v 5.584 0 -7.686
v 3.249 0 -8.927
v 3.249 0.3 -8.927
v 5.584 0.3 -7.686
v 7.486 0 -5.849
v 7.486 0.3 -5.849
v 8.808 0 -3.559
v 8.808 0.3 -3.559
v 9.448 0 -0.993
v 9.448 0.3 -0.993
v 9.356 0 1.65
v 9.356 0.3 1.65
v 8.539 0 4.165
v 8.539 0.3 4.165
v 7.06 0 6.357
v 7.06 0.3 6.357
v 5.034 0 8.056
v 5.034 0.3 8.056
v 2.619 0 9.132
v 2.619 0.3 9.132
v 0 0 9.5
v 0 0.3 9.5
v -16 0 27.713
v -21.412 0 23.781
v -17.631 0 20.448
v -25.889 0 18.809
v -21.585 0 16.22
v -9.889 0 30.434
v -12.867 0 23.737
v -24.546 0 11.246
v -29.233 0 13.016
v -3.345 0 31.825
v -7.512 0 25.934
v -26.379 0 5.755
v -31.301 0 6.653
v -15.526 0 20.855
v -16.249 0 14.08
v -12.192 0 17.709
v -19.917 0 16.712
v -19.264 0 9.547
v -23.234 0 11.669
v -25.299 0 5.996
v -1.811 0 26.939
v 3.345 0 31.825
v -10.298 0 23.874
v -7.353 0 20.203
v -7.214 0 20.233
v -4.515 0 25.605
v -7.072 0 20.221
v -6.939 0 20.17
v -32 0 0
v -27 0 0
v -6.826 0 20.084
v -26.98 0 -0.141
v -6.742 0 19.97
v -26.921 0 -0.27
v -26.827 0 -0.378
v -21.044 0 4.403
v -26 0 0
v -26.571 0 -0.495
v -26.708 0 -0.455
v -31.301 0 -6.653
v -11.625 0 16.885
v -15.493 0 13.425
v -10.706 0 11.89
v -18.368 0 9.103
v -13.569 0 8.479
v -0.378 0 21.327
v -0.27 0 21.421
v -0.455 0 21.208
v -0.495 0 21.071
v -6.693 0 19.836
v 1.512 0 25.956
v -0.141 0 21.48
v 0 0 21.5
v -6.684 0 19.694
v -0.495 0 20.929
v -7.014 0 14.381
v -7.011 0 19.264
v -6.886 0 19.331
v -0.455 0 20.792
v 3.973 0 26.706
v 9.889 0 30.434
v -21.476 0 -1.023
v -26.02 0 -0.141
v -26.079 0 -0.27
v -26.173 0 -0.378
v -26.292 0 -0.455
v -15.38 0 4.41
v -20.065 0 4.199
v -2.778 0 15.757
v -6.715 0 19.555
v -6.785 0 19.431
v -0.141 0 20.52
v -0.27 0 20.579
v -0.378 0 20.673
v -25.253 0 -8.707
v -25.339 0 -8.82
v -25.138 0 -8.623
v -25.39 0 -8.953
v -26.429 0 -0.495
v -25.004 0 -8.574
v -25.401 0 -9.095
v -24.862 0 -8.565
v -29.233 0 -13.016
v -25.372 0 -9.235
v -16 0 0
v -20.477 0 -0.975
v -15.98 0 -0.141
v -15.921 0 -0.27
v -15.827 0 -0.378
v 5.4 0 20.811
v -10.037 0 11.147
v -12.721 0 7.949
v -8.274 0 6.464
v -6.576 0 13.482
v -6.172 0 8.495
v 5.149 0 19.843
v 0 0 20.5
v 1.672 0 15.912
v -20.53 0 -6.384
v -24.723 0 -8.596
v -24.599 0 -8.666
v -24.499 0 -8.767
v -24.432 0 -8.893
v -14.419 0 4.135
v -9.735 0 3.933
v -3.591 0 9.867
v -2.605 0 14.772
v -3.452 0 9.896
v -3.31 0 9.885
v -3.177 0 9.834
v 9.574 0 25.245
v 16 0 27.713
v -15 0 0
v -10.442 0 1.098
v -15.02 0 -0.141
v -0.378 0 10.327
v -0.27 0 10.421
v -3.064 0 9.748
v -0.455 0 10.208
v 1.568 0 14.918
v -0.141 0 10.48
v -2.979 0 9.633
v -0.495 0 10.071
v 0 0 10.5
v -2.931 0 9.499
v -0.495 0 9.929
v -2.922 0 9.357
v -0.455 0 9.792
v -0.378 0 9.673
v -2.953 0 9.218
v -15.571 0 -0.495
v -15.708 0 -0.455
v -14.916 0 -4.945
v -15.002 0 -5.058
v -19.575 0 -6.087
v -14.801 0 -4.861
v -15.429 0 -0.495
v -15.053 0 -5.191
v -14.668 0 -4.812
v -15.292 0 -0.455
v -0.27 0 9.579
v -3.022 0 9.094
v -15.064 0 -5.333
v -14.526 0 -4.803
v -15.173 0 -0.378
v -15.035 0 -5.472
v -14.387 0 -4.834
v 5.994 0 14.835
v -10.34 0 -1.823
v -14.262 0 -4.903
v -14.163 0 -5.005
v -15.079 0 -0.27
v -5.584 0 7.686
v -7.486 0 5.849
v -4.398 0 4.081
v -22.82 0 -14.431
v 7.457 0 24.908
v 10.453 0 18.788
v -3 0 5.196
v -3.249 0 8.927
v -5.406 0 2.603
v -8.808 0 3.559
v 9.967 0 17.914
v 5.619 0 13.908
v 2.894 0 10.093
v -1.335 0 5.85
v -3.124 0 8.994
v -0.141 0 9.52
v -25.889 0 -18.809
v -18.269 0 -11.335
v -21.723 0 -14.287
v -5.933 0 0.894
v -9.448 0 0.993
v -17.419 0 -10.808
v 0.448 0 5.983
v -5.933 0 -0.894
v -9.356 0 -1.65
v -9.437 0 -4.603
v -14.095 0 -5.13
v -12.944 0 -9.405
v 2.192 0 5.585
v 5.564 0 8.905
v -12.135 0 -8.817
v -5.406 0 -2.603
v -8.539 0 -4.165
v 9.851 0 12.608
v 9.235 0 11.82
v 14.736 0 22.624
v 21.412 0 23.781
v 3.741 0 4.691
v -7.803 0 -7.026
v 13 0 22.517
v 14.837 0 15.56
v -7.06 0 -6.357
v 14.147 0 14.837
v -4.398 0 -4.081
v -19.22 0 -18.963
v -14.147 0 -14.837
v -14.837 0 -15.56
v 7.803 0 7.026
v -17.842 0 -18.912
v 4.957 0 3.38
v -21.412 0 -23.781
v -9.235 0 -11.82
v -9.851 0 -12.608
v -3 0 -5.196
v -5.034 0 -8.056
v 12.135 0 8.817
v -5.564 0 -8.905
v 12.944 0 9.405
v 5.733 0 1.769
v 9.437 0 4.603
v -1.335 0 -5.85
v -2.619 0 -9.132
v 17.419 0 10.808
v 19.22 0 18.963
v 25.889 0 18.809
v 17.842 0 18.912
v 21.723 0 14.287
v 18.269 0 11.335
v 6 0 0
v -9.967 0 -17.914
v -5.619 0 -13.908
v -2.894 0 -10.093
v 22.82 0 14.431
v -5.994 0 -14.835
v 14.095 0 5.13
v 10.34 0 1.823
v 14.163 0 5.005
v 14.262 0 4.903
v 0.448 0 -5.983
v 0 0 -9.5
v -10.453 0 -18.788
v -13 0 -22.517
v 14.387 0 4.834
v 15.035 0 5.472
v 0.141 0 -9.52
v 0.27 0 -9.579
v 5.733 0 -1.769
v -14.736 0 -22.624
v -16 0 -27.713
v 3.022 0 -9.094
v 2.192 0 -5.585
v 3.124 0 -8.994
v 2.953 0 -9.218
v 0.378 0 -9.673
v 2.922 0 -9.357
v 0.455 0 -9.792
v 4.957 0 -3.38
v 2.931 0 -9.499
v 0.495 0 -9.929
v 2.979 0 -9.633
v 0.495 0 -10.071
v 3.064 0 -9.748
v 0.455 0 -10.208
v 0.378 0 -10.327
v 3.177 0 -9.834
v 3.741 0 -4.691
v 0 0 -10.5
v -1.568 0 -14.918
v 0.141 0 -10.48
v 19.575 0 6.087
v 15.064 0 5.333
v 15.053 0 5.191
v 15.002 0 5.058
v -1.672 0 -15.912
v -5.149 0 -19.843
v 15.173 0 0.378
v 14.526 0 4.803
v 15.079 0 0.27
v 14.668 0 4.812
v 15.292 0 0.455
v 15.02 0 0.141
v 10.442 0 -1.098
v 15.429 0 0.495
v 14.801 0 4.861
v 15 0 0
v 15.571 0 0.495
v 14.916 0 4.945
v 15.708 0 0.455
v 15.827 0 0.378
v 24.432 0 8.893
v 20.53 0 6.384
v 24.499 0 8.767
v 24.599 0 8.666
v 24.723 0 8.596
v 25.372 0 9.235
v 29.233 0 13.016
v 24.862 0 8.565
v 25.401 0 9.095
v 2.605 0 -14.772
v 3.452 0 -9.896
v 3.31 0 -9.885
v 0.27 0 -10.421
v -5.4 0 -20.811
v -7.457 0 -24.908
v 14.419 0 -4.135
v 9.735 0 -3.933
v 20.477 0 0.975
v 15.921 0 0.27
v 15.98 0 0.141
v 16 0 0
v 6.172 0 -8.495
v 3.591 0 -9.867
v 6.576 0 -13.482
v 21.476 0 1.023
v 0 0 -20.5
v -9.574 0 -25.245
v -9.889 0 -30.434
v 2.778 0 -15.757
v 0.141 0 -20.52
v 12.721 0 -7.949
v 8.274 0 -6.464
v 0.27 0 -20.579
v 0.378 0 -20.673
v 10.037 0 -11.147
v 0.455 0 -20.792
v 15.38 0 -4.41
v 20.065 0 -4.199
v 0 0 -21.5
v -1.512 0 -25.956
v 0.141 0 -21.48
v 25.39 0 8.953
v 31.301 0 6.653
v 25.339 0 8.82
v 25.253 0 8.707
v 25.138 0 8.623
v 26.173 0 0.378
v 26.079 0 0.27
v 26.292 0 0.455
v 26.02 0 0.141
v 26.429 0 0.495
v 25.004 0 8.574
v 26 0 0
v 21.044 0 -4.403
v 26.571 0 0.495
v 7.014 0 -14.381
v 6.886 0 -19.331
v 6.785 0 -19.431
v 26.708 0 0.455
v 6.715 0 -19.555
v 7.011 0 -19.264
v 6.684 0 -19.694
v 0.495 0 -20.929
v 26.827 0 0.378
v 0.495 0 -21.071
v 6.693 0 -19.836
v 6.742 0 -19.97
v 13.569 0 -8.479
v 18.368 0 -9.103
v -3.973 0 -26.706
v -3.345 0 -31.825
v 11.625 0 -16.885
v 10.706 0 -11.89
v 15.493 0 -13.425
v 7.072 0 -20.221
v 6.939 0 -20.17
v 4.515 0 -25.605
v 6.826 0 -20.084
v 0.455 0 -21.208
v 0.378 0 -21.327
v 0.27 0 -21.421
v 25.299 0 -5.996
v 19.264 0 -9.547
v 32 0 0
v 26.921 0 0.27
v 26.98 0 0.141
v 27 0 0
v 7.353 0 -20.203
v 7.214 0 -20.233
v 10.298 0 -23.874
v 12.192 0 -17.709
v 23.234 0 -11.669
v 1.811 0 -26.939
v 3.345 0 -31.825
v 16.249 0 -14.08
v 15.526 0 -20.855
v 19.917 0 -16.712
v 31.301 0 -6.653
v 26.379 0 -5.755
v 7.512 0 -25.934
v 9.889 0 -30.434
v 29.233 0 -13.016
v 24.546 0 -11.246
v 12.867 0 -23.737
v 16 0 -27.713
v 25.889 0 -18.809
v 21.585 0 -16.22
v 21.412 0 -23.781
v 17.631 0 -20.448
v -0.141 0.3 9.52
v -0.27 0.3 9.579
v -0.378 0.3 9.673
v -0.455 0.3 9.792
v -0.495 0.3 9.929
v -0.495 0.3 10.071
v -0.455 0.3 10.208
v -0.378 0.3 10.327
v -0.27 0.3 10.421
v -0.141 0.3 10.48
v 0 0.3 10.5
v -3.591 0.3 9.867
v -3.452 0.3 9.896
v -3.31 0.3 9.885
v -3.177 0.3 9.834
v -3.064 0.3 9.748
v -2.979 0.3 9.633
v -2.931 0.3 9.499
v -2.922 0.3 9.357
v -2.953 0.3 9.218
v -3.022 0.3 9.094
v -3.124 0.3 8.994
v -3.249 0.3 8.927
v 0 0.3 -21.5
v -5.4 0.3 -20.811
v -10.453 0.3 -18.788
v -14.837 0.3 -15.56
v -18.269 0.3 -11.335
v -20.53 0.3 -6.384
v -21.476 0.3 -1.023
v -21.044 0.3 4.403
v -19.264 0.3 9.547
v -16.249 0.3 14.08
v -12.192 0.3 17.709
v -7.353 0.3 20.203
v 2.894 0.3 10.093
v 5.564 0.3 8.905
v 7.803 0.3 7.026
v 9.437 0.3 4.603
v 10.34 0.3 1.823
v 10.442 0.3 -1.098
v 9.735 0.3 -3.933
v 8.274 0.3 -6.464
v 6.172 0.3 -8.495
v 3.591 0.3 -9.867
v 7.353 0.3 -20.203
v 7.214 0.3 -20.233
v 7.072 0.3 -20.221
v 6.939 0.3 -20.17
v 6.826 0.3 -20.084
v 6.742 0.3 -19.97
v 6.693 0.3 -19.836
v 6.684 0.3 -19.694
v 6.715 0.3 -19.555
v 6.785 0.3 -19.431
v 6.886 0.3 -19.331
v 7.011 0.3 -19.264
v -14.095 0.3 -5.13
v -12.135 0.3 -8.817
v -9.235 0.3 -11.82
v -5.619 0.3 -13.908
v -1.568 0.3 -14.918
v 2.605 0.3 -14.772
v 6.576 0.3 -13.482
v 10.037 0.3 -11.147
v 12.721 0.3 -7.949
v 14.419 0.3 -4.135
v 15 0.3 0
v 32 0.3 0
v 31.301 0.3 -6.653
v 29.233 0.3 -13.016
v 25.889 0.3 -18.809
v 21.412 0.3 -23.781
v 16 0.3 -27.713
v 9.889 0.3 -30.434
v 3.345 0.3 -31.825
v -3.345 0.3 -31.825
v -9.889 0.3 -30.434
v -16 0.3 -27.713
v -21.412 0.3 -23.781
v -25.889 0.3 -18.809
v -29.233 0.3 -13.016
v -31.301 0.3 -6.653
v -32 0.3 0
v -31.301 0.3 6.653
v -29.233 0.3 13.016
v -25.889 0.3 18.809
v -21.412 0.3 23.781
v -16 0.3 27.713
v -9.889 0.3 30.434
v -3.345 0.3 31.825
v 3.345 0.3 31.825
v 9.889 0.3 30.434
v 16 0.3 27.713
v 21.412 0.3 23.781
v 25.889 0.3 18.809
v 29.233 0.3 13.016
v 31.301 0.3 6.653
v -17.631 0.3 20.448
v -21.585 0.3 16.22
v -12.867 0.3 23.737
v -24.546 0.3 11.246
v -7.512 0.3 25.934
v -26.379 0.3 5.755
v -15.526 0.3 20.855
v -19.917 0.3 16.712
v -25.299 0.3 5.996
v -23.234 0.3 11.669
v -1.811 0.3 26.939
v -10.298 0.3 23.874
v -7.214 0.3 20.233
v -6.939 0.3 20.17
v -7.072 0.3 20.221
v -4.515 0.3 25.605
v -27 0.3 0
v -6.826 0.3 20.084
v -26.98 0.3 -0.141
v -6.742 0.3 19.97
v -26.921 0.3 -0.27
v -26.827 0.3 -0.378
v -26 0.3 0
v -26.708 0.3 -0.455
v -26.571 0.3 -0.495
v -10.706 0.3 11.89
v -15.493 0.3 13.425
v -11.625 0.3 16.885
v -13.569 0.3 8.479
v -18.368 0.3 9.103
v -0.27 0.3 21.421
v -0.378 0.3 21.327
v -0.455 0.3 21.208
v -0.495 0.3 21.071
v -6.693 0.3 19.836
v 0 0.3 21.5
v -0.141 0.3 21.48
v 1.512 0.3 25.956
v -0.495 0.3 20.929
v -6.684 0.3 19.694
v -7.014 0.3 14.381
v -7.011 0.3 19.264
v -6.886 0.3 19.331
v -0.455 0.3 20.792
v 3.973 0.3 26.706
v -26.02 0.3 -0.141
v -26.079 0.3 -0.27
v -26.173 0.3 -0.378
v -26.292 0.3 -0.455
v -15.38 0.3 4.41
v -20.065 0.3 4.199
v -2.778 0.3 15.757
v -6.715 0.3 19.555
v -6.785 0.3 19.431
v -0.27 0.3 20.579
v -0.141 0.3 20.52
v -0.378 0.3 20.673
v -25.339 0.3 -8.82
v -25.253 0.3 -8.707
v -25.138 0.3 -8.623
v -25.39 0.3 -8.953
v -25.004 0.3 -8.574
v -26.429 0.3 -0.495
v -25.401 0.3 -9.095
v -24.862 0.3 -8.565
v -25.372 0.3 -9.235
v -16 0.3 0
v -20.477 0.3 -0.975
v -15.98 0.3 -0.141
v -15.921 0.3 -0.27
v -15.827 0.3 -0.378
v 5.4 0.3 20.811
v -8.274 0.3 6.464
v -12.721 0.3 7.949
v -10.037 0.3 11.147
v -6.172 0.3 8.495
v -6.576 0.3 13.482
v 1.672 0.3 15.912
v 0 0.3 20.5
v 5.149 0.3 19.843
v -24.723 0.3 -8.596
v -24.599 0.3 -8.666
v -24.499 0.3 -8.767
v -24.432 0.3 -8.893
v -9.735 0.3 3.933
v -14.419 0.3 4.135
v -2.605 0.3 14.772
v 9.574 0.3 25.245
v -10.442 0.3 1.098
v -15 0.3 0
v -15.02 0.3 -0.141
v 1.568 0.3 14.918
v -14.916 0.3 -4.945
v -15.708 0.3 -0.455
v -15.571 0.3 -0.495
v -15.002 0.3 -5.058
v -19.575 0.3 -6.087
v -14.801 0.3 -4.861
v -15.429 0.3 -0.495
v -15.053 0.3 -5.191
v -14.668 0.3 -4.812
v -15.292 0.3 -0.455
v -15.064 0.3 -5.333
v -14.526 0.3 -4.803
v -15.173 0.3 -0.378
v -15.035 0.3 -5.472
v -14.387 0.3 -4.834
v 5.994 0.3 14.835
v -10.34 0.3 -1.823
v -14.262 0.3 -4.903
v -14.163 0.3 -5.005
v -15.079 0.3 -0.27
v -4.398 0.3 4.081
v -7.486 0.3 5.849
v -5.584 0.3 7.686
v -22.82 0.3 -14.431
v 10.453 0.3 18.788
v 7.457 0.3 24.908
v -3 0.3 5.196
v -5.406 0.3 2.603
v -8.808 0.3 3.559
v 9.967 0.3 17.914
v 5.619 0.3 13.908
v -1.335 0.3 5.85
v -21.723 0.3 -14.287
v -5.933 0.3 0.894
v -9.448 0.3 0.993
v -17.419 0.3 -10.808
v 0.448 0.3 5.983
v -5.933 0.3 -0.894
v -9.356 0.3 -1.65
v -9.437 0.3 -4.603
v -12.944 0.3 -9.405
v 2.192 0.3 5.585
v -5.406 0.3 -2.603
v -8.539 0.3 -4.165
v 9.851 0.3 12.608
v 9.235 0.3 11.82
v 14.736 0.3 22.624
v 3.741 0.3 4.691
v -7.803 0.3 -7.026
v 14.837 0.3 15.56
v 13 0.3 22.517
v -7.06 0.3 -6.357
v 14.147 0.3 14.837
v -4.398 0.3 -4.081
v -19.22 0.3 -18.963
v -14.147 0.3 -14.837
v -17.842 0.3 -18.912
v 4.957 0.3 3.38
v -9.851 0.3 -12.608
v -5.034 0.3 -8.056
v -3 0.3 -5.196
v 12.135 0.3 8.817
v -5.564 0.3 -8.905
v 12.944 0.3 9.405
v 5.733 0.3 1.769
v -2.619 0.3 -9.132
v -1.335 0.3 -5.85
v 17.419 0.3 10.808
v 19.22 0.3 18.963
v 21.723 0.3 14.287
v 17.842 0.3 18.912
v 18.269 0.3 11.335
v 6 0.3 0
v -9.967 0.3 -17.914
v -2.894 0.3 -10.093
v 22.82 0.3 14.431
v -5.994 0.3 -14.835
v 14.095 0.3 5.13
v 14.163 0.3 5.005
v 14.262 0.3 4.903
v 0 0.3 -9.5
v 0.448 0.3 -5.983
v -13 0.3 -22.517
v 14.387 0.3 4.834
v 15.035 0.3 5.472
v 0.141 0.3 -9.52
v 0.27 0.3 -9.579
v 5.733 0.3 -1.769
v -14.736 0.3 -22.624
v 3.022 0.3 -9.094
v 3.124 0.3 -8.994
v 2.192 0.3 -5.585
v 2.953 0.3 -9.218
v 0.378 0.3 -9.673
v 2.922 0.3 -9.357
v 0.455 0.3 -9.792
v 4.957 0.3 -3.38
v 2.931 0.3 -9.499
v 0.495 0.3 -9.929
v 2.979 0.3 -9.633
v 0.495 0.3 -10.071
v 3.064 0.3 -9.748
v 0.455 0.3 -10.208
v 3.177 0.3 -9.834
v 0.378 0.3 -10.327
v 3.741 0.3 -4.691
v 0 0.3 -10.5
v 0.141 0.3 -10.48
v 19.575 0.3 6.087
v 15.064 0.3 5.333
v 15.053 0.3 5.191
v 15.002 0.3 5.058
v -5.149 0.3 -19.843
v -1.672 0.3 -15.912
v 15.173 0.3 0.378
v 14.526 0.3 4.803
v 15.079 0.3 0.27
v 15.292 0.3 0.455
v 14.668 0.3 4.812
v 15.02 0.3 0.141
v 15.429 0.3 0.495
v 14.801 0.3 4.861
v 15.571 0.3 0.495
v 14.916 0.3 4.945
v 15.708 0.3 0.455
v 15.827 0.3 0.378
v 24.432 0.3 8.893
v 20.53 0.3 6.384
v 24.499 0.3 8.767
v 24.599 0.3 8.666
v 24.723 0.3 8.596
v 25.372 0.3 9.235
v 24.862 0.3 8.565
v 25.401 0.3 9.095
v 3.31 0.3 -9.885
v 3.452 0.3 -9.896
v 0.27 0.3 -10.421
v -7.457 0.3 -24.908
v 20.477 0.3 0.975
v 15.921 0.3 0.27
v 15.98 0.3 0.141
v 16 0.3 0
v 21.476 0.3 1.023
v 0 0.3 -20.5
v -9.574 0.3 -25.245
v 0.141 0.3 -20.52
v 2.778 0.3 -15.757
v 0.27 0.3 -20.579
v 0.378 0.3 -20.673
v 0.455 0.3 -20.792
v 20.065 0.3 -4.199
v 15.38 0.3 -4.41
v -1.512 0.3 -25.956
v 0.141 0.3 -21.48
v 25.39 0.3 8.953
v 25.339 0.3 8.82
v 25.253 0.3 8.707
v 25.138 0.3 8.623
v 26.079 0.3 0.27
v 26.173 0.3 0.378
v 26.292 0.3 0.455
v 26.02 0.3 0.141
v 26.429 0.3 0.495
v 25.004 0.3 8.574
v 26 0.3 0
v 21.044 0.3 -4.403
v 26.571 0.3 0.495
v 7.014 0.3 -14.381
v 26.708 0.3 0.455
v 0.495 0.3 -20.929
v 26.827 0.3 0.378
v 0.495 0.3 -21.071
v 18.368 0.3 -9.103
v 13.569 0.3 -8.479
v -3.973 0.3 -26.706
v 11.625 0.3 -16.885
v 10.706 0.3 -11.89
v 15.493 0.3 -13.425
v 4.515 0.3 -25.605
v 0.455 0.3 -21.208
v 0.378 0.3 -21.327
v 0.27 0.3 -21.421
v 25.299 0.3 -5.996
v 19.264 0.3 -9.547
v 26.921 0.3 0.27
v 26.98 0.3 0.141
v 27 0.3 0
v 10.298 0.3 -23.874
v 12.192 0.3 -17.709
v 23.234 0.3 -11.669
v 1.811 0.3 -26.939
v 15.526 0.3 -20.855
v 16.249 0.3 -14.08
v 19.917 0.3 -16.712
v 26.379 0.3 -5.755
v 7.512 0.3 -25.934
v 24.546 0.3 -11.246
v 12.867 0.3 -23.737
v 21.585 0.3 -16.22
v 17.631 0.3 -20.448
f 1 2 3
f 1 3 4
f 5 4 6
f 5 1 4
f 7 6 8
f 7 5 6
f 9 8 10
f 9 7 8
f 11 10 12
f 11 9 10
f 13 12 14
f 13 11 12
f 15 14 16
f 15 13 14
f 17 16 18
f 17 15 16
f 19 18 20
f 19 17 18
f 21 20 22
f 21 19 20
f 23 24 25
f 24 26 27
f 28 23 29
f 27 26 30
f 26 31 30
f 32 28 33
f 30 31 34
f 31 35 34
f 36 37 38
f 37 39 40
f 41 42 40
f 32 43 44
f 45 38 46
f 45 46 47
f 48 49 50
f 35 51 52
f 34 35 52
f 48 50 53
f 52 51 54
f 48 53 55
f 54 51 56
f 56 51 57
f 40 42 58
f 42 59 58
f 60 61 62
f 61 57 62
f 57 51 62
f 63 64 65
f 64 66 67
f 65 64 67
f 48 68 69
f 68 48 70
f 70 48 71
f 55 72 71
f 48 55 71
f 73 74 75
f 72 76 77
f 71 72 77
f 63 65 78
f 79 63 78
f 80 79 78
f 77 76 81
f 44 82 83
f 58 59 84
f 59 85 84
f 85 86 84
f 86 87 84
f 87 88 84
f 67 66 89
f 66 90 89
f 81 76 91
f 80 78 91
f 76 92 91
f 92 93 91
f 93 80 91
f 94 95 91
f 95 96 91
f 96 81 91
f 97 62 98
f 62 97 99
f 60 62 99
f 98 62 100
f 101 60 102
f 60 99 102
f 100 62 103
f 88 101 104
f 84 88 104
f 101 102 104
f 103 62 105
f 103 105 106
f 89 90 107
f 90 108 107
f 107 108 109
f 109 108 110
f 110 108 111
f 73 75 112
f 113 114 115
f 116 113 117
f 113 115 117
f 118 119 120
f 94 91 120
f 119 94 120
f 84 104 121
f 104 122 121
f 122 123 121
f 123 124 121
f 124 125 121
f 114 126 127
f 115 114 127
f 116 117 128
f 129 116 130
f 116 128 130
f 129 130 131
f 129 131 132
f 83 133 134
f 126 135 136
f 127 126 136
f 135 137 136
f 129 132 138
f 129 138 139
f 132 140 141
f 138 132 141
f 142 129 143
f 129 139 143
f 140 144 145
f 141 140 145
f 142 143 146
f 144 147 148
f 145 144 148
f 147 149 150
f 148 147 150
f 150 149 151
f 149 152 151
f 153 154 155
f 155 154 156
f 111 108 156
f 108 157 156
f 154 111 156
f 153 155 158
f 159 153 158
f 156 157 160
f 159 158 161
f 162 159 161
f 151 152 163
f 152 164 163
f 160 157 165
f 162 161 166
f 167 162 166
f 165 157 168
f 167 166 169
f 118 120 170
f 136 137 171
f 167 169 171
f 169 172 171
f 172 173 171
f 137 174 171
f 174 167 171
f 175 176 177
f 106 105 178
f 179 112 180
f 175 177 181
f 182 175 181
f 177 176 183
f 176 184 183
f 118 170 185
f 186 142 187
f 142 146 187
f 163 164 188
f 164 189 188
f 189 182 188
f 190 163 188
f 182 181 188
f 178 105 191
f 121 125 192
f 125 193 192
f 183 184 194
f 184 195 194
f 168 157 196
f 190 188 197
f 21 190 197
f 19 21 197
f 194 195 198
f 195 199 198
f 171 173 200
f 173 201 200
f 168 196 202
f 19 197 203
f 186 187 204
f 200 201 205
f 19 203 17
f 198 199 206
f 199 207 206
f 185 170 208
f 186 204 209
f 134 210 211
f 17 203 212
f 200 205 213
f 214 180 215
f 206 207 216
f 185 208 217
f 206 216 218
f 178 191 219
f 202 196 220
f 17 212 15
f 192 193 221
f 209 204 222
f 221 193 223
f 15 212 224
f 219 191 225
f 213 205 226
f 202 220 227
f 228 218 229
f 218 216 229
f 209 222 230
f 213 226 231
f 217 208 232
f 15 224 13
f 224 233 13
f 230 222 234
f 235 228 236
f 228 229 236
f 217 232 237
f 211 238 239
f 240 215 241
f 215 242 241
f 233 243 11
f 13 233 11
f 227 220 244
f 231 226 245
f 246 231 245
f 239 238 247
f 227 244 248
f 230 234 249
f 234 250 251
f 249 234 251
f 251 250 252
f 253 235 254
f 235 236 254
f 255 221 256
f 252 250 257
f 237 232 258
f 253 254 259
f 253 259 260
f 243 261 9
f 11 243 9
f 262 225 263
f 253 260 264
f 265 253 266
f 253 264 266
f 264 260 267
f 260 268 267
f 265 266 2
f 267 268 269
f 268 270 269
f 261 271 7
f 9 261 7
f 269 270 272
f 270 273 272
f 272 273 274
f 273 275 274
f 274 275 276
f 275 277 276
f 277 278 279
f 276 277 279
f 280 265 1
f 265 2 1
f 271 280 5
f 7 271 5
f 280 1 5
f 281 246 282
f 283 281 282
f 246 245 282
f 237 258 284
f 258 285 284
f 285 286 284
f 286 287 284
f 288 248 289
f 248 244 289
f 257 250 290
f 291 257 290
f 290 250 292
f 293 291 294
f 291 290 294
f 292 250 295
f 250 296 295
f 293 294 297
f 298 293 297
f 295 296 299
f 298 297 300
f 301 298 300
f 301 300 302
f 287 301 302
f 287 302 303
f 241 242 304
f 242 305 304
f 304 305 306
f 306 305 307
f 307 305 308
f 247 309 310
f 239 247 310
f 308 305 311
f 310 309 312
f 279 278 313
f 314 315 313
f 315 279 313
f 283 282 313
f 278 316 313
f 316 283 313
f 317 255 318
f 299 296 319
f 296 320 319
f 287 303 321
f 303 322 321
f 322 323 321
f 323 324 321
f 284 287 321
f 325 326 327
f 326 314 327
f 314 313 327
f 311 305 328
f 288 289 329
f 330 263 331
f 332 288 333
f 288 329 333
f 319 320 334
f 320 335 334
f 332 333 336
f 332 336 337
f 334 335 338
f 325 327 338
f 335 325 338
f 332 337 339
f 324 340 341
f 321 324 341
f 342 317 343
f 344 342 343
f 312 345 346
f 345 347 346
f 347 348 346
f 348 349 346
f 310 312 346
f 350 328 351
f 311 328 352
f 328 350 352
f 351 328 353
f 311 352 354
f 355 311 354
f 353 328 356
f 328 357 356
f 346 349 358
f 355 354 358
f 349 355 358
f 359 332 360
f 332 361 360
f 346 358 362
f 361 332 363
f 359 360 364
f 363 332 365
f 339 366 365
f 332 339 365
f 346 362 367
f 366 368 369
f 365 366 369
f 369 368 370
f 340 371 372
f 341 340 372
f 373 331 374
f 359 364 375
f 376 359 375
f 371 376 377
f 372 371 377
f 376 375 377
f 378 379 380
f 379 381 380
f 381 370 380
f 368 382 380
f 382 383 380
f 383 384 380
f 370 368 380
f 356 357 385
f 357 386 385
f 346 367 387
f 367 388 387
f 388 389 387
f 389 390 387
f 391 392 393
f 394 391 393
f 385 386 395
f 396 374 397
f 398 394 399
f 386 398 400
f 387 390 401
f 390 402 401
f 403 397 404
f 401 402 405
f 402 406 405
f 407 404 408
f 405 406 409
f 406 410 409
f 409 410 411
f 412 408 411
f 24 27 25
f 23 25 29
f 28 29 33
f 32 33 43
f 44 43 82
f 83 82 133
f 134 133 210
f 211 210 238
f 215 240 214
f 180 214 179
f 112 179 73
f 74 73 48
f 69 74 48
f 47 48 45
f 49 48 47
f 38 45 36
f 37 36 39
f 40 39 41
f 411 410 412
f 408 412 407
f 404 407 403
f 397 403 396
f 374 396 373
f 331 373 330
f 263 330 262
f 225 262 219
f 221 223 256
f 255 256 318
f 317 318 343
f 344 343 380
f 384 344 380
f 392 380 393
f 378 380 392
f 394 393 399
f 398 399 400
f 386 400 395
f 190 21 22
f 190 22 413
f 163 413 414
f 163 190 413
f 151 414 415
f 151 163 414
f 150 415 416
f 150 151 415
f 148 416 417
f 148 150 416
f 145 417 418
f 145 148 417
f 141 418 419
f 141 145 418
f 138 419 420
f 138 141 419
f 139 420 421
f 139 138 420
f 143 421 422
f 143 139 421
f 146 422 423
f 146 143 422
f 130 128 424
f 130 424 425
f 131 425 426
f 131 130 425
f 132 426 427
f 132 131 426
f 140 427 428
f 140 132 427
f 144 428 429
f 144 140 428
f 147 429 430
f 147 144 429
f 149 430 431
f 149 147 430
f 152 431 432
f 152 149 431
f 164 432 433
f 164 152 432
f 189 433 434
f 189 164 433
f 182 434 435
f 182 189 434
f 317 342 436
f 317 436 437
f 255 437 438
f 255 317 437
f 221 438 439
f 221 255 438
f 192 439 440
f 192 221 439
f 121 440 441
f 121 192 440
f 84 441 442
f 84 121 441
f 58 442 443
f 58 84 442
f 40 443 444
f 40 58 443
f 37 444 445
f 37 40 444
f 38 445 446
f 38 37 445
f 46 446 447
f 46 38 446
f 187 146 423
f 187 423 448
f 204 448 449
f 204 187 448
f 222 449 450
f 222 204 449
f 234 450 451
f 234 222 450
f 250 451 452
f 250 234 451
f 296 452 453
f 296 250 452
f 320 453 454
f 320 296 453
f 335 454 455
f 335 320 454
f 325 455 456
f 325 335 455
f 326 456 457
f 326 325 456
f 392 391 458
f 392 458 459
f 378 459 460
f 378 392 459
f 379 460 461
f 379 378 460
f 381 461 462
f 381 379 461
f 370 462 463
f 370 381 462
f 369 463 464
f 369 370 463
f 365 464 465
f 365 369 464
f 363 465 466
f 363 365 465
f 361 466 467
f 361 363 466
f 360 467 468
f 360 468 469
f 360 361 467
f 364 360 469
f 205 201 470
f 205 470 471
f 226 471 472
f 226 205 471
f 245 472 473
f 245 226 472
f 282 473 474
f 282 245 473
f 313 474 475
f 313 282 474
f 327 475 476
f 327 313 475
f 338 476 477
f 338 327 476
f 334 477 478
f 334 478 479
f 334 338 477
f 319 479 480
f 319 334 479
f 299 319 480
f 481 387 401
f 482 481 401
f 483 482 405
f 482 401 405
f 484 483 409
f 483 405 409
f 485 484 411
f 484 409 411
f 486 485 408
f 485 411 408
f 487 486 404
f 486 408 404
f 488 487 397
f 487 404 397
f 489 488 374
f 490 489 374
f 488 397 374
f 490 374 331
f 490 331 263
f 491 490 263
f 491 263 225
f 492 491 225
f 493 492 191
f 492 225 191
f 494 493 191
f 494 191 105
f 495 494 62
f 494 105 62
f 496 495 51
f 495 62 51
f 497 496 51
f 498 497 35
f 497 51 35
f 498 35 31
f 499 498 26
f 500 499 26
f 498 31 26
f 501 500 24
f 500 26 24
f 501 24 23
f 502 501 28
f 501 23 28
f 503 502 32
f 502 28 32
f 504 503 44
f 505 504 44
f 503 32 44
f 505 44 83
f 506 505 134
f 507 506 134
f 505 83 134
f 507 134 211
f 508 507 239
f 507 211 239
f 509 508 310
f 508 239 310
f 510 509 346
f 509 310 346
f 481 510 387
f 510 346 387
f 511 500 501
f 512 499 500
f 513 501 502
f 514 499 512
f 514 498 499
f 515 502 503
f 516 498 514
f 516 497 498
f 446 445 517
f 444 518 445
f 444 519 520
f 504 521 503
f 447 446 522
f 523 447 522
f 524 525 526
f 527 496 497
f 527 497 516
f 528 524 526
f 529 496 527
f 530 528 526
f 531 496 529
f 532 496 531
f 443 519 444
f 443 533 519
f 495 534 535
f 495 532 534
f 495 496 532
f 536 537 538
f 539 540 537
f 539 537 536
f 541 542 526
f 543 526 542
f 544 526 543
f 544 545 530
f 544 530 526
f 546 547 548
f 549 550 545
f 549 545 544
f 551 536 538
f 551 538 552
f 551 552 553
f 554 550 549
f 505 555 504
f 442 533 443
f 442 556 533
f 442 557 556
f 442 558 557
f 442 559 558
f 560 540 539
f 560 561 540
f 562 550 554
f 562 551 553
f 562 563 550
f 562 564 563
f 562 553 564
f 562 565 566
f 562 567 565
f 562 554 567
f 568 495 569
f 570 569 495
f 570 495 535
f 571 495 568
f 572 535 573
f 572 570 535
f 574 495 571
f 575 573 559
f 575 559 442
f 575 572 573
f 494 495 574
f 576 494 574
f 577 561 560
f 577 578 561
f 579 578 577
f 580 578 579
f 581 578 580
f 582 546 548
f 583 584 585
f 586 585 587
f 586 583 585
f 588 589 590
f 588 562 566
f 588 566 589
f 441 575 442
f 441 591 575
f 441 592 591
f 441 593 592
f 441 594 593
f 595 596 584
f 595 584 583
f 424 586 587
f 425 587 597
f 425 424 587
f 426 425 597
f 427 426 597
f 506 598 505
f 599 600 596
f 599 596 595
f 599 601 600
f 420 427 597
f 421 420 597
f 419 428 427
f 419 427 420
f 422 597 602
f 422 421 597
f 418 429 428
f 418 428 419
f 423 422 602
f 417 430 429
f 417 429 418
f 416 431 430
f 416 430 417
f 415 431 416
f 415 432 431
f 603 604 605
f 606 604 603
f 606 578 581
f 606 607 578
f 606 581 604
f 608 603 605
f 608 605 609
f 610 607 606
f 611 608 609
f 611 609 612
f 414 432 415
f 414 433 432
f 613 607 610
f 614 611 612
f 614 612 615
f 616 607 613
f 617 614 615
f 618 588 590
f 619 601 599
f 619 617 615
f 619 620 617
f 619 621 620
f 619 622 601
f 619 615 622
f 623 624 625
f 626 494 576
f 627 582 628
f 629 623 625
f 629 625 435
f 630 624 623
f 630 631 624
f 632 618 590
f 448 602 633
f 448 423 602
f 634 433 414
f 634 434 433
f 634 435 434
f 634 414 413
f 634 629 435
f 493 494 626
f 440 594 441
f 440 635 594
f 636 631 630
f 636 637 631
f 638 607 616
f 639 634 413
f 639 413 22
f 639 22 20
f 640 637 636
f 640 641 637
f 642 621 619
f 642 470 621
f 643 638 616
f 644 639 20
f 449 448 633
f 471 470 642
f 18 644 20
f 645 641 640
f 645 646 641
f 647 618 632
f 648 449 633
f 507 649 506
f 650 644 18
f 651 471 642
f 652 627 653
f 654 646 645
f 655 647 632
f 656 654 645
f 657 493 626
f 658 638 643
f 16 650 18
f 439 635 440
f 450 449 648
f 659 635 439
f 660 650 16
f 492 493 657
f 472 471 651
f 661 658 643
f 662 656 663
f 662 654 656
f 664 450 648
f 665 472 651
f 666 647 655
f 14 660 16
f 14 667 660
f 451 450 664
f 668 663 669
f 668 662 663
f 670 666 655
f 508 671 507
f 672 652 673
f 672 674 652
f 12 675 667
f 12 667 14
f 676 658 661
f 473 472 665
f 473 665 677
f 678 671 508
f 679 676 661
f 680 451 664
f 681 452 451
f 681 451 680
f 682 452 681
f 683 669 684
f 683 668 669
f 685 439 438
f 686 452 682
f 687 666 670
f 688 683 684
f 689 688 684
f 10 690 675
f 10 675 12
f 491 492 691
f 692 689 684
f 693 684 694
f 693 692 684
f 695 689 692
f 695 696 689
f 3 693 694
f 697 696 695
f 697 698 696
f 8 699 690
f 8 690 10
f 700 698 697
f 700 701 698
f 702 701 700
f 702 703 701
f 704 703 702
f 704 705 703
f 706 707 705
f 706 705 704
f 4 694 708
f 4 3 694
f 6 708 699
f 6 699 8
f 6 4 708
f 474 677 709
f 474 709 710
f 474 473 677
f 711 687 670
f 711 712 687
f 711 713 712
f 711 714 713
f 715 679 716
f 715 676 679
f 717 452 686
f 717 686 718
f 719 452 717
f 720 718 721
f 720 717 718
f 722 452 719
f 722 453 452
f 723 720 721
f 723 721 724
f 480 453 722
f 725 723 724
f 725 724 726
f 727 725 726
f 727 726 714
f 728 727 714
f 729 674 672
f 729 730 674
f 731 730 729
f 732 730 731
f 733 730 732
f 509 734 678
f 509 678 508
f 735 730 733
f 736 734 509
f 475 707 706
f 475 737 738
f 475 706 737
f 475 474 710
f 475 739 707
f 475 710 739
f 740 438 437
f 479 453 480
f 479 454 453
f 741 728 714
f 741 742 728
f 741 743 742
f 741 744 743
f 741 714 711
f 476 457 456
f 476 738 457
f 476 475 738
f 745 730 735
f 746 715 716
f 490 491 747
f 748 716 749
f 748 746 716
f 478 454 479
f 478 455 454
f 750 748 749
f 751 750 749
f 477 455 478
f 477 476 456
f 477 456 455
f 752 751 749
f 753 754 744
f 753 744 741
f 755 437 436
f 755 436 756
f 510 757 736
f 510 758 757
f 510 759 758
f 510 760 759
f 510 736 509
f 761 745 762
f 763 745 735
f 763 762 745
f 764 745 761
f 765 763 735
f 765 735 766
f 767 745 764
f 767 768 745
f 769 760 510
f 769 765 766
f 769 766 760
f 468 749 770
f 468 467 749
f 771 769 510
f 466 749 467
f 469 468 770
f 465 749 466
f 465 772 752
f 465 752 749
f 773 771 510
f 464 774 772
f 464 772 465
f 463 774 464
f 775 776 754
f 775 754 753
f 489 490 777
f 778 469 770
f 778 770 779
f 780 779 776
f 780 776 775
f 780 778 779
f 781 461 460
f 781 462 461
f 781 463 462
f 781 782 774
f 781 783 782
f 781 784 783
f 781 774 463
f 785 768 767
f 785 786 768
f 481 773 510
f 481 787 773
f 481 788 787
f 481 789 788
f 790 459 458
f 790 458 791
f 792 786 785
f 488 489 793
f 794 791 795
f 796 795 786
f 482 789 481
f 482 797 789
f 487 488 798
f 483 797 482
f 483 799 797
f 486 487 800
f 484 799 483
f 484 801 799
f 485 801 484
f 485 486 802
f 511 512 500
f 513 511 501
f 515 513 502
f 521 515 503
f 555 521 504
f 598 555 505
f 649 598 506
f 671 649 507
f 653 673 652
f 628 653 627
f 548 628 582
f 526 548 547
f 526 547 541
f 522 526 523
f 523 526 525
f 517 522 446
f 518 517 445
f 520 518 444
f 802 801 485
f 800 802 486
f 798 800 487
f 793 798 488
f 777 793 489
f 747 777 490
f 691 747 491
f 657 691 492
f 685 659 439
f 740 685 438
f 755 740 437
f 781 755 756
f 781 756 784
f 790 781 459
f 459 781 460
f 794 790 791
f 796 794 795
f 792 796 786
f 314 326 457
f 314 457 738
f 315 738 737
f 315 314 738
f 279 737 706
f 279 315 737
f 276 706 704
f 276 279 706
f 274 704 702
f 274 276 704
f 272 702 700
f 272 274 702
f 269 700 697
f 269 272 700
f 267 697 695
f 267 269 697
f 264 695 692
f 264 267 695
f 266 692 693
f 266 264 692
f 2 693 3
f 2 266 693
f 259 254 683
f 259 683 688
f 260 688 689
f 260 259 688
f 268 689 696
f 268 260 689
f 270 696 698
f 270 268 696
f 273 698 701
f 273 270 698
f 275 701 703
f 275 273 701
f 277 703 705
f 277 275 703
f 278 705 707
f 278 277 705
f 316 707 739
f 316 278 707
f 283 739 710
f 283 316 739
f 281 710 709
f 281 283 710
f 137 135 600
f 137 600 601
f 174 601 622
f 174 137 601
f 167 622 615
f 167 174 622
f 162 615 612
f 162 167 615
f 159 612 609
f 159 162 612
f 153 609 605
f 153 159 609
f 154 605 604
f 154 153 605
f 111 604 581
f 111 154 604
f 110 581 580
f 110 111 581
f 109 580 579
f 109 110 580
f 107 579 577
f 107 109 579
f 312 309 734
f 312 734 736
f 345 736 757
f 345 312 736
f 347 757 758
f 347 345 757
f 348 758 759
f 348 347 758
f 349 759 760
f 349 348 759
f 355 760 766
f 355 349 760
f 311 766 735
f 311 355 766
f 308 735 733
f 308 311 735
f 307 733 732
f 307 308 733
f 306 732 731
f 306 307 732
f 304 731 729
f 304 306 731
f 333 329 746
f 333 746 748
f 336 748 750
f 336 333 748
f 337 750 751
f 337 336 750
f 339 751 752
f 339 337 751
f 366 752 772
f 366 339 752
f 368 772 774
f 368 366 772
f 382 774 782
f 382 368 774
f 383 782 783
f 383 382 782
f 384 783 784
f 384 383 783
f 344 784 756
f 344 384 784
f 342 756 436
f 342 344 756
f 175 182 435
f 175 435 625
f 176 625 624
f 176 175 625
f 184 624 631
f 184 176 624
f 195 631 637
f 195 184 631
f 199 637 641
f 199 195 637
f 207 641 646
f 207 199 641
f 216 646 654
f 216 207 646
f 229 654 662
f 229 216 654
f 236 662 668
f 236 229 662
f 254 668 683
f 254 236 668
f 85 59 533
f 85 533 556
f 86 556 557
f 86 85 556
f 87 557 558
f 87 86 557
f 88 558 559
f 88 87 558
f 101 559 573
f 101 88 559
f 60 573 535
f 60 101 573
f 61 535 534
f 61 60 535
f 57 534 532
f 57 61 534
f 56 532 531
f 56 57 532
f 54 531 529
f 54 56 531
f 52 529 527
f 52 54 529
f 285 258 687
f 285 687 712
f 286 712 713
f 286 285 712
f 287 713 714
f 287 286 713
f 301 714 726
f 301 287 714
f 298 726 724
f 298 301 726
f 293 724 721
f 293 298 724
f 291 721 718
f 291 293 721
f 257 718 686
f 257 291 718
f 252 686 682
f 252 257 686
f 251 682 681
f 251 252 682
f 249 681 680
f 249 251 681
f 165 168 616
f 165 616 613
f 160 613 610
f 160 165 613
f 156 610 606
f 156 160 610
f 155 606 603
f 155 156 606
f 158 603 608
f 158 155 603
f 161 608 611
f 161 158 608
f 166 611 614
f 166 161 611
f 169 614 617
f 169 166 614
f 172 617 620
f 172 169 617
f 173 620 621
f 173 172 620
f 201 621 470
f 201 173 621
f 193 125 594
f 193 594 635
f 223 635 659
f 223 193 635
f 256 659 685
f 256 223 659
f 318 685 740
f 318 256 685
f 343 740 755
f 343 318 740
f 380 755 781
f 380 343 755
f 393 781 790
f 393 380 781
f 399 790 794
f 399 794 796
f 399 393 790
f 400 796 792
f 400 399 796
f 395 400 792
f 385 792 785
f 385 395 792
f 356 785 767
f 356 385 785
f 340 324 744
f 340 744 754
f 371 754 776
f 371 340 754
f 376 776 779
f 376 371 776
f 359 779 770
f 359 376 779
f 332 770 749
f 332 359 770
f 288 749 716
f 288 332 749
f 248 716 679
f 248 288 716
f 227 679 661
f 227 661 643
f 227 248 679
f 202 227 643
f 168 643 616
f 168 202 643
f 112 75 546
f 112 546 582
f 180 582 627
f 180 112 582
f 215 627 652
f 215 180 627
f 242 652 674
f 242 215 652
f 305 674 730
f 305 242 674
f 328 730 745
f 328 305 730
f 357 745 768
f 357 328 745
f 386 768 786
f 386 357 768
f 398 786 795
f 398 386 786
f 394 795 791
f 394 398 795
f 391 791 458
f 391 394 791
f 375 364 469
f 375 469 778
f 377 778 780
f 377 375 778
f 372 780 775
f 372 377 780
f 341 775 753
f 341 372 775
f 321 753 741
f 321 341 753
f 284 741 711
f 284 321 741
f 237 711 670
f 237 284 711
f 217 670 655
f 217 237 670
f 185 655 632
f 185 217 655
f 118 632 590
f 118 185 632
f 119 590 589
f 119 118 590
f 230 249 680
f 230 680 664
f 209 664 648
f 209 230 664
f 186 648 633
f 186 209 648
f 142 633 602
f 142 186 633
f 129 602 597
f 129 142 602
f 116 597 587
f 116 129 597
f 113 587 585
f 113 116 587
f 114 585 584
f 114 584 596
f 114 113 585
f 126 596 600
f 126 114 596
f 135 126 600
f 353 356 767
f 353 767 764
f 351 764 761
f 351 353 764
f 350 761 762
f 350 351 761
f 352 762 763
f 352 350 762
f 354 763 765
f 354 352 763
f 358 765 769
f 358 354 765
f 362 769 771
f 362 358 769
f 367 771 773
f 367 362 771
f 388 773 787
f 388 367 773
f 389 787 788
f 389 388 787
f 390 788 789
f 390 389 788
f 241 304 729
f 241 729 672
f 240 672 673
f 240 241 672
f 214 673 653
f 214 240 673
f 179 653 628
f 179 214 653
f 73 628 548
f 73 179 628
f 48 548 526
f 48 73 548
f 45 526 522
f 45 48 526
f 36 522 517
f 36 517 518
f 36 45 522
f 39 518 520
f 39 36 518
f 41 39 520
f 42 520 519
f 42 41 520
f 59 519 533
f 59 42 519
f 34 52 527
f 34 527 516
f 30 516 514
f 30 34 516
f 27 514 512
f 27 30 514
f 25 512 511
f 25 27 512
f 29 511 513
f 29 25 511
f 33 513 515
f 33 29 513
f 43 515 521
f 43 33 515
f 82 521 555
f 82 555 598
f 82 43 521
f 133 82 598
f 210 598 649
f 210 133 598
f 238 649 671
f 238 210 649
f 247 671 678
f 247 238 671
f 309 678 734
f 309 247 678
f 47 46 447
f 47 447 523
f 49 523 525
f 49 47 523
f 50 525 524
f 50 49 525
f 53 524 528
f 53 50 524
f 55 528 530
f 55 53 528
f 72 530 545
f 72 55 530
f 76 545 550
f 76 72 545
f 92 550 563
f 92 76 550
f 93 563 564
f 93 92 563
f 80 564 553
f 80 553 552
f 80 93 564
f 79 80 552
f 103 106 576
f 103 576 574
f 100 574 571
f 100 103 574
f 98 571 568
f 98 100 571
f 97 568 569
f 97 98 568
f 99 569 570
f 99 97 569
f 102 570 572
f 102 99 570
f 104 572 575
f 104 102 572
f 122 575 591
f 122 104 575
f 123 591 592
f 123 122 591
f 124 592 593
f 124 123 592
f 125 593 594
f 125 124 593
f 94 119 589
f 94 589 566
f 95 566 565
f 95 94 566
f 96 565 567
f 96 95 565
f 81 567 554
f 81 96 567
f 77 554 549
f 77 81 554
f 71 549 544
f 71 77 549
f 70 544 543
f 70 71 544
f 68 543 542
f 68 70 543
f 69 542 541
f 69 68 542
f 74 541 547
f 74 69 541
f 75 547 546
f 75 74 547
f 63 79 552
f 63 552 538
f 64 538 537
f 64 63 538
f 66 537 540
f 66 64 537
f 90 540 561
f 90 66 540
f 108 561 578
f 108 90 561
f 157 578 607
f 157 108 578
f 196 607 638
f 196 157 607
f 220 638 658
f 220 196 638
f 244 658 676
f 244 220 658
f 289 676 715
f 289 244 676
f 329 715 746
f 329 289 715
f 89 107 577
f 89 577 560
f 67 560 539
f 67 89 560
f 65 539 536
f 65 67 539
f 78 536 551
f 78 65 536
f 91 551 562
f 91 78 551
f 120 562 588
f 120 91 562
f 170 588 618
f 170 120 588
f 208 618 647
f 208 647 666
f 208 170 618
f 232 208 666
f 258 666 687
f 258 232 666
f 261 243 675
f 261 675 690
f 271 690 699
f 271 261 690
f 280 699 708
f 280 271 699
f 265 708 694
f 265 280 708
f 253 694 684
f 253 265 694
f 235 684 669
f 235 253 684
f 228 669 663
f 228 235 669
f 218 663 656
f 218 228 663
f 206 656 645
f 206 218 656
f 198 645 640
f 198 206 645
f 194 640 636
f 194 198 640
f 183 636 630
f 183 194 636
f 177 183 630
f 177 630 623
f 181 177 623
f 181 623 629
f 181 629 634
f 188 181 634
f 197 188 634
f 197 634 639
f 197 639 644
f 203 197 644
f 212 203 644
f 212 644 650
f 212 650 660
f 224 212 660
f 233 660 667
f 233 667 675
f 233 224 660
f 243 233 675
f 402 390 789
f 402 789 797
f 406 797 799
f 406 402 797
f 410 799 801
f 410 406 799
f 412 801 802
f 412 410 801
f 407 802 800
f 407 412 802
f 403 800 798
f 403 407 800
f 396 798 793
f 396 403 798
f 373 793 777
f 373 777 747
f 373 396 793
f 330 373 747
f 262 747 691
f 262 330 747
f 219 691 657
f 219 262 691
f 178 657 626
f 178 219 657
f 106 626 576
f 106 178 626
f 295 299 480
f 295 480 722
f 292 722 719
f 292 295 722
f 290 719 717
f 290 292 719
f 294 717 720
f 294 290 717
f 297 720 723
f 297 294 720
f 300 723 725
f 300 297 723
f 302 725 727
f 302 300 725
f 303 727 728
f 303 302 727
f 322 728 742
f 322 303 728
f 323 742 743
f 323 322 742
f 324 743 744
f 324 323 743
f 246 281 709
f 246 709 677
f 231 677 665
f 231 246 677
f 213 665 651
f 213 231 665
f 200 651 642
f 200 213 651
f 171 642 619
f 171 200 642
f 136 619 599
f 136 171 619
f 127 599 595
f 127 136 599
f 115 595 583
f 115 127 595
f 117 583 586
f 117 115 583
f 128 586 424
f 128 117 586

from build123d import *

# Parameters (mm, degrees)
SKETCH1_R           = 32
SKETCH1_R_2         = 6
BOSS_EXTRUDE1_DEPTH = 0.3


with BuildPart() as part:
    # Sketch1 → Boss-Extrude1 (new body)
    with BuildSketch(Plane(origin=(0, 0, 0), x_dir=(1, 0, 0), z_dir=(0, 1, 0))):
        Circle(SKETCH1_R)
        Circle(SKETCH1_R_2, mode=Mode.SUBTRACT)
        with BuildLine():
            ThreePointArc((27, 0), (4.688500797, 26.589809331), (-25.371700761, 9.23454387))
            ThreePointArc((-25.371700761, 9.23454387), (-25.072864522, 8.593687488), (-24.43200814, 8.892523726))
            ThreePointArc((-24.43200814, 8.892523726), (4.514852619, 25.605001578), (26, 0))
            ThreePointArc((26, 0), (26.5, -0.5), (27, 0))
        make_face(mode=Mode.SUBTRACT)
        with BuildLine():
            ThreePointArc((0, 21.5), (-21.17336669, 3.73343582), (-7.353433082, -20.203391347))
            ThreePointArc((-7.353433082, -20.203391347), (-6.712576699, -19.904555108), (-7.011412938, -19.263698726))
            ThreePointArc((-7.011412938, -19.263698726), (-20.188558937, 3.559787642), (0, 20.5))
            ThreePointArc((0, 20.5), (0.5, 21), (0, 21.5))
        make_face(mode=Mode.SUBTRACT)
        with BuildLine():
            ThreePointArc((16, 0), (2.778370843, 15.756924048), (-15.035081933, 5.472322293))
            ThreePointArc((-15.035081933, 5.472322293), (-14.736245694, 4.831465911), (-14.095389312, 5.13030215))
            ThreePointArc((-14.095389312, 5.13030215), (2.604722665, 14.772116295), (15, 0))
            ThreePointArc((15, 0), (15.5, -0.5), (16, 0))
        make_face(mode=Mode.SUBTRACT)
        with BuildLine():
            ThreePointArc((0, -21.5), (21.17336669, -3.73343582), (7.353433082, 20.203391347))
            ThreePointArc((7.353433082, 20.203391347), (6.712576699, 19.904555108), (7.011412938, 19.263698726))
            ThreePointArc((7.011412938, 19.263698726), (20.188558937, -3.559787642), (0, -20.5))
            ThreePointArc((0, -20.5), (-0.5, -21), (0, -21.5))
        make_face(mode=Mode.SUBTRACT)
        with BuildLine():
            ThreePointArc((0, 10.5), (-10.340481407, 1.823305866), (-3.591211505, -9.866772518))
            ThreePointArc((-3.591211505, -9.866772518), (-2.950355123, -9.56793628), (-3.249191362, -8.927079897))
            ThreePointArc((-3.249191362, -8.927079897), (-9.355673654, 1.649657688), (0, 9.5))
            ThreePointArc((0, 9.5), (0.5, 10), (0, 10.5))
        make_face(mode=Mode.SUBTRACT)
        with BuildLine():
            ThreePointArc((0, -10.5), (10.340481407, -1.823305866), (3.591211505, 9.866772518))
            ThreePointArc((3.591211505, 9.866772518), (2.950355123, 9.56793628), (3.249191362, 8.927079897))
            ThreePointArc((3.249191362, 8.927079897), (9.355673654, -1.649657688), (0, -9.5))
            ThreePointArc((0, -9.5), (-0.5, -10), (0, -10.5))
        make_face(mode=Mode.SUBTRACT)
        with BuildLine():
            ThreePointArc((-16, 0), (-2.778370843, -15.756924048), (15.035081933, -5.472322293))
            ThreePointArc((15.035081933, -5.472322293), (14.736245694, -4.831465911), (14.095389312, -5.13030215))
            ThreePointArc((14.095389312, -5.13030215), (-2.604722665, -14.772116295), (-15, 0))
            ThreePointArc((-15, 0), (-15.5, 0.5), (-16, 0))
        make_face(mode=Mode.SUBTRACT)
        with BuildLine():
            ThreePointArc((-27, 0), (-4.688500797, -26.589809331), (25.371700761, -9.23454387))
            ThreePointArc((25.371700761, -9.23454387), (25.072864522, -8.593687488), (24.43200814, -8.892523726))
            ThreePointArc((24.43200814, -8.892523726), (-4.514852619, -25.605001578), (-26, 0))
            ThreePointArc((-26, 0), (-26.5, 0.5), (-27, 0))
        make_face(mode=Mode.SUBTRACT)
    extrude(amount=BOSS_EXTRUDE1_DEPTH)


solid = part.part
